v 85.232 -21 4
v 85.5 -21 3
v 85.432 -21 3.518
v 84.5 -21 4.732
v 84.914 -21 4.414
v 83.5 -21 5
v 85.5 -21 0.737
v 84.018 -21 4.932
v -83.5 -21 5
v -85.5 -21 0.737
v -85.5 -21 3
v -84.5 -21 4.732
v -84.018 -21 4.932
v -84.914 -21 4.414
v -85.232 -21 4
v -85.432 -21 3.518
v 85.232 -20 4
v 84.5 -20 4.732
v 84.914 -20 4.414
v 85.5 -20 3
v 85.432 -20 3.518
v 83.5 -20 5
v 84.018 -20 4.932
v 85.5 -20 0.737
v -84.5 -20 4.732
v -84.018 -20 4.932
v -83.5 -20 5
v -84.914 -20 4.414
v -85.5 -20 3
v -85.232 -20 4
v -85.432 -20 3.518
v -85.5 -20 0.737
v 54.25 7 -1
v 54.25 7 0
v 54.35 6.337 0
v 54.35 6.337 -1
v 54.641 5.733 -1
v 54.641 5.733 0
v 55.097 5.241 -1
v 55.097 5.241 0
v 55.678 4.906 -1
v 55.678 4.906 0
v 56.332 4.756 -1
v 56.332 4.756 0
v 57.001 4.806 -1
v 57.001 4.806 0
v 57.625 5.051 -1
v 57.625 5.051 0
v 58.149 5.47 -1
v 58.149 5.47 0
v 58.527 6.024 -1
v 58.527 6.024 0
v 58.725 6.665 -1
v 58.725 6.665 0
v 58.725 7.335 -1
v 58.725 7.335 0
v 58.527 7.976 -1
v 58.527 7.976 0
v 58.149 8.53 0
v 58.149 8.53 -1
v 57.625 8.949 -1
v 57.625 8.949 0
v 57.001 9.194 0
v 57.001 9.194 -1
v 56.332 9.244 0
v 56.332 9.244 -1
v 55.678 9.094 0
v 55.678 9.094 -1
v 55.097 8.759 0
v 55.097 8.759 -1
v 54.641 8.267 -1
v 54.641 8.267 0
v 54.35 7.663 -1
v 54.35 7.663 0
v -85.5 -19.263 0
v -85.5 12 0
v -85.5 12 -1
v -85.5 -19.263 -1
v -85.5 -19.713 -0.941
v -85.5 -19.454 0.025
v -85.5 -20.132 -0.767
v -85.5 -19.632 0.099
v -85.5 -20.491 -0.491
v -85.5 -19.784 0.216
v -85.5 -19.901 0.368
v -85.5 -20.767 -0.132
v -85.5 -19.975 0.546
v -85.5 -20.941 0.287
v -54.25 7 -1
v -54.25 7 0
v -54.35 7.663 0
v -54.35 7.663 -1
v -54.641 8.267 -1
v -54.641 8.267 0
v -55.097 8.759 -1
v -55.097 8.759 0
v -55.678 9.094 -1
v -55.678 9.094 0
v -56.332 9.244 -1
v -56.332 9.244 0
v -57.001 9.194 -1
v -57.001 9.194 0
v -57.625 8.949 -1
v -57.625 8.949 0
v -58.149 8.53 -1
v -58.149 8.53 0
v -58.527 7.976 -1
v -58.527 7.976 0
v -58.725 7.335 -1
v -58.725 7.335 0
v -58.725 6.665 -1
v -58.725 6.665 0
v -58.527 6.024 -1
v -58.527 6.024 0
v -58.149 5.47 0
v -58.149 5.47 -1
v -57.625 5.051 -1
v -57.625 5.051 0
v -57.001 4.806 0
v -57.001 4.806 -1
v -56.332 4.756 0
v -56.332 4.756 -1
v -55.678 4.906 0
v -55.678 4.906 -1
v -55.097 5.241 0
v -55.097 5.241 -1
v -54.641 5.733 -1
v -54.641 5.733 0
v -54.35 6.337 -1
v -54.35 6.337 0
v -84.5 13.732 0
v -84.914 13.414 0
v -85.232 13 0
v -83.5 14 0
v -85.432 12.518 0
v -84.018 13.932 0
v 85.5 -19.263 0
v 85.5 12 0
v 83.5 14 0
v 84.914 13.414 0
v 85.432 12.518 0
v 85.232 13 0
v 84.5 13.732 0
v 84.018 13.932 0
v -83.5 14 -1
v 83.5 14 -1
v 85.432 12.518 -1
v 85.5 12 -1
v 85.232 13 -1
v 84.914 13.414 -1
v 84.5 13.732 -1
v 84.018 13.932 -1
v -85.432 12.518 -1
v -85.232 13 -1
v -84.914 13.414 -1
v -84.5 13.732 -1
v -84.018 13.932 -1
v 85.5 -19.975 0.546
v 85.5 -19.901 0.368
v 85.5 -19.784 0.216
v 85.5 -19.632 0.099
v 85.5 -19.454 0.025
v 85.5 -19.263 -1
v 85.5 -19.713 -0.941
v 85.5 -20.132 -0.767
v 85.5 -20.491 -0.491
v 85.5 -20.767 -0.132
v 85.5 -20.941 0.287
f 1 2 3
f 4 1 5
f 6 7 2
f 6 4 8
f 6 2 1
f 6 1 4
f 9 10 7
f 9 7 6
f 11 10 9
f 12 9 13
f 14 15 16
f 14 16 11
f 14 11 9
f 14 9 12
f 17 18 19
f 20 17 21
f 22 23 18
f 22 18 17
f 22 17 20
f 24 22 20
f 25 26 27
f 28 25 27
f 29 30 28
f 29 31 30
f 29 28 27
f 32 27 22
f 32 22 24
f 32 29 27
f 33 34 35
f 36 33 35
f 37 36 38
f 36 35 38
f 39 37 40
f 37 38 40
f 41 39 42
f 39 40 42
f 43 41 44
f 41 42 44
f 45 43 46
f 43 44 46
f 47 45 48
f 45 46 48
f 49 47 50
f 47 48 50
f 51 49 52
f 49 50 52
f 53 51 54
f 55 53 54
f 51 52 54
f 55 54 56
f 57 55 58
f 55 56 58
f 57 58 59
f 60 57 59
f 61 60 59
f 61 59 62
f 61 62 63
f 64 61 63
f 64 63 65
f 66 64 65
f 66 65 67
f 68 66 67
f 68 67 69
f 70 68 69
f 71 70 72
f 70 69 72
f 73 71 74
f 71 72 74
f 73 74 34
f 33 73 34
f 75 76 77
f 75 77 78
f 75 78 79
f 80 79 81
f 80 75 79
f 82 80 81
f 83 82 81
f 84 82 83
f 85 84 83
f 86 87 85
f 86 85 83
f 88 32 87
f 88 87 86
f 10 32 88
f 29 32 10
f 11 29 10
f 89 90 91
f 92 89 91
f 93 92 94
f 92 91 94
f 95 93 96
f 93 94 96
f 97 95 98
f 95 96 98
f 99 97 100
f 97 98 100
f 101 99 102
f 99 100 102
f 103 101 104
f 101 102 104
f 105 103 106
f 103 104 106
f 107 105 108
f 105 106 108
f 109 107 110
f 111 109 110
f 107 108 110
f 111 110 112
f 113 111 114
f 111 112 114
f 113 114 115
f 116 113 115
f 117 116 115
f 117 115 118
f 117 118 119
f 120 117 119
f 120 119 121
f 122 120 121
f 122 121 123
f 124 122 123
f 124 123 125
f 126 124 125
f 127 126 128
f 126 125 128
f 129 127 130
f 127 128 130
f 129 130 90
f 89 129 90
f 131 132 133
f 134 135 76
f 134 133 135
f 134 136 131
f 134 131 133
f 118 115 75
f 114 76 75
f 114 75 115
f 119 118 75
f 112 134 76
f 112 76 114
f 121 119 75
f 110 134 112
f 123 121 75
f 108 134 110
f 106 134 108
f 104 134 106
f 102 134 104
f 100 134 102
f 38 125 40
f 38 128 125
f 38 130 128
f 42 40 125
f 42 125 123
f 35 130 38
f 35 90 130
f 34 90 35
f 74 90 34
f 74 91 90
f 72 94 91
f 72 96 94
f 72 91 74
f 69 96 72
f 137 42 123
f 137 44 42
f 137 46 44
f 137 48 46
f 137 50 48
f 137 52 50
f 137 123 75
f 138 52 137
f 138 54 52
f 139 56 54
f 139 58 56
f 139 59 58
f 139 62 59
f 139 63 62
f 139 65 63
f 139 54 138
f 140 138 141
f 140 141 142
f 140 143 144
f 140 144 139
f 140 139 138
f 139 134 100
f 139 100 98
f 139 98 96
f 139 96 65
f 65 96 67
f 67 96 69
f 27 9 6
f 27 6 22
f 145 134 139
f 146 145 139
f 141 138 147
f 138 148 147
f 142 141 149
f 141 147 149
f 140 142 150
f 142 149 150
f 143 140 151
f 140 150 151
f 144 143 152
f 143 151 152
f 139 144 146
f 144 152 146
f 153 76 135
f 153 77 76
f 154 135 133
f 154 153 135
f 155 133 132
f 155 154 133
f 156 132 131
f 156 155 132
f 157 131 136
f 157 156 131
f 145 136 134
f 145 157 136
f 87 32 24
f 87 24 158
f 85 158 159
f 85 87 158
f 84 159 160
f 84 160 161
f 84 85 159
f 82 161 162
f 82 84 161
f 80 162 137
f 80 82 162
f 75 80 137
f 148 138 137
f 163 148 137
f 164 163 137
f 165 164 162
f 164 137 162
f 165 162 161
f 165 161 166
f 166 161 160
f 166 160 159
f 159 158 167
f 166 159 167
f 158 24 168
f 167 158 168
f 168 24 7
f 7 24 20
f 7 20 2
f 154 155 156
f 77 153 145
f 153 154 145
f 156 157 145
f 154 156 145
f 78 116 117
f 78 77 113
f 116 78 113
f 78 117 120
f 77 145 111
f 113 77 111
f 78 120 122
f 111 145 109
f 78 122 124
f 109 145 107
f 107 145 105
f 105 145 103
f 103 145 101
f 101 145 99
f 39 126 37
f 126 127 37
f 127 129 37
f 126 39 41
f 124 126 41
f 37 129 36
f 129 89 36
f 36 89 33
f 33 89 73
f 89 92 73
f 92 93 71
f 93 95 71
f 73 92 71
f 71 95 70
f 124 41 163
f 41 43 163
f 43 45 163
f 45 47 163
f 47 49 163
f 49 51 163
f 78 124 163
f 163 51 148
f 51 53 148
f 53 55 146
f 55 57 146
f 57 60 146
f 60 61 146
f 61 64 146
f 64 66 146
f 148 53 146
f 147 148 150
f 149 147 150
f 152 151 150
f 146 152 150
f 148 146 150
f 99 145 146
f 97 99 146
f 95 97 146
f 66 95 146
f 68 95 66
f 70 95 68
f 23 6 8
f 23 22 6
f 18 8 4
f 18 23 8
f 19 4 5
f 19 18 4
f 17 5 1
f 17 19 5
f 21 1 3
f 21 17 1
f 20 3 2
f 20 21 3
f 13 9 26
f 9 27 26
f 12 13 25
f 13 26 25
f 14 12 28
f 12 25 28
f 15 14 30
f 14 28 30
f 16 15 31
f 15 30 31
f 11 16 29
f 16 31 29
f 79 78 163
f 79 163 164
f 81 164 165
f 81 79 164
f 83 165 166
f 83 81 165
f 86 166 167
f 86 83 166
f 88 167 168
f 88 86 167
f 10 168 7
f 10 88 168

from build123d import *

# Parameters (mm, degrees)
ESQUISSE1_W                           = 171
ESQUISSE1_H                           = 34
ESQUISSE1_R                           = 2.25
T_LE_DE_BASE_PLI_E1_DEPTH             = 1
T_LE_PLI_E_SUR_AR_TE1_STRIP_W         = 5.4732
T_LE_PLI_E_SUR_AR_TE1_STRIP_H         = 1
T_LE_PLI_E_SUR_AR_TE1_STRIP_CUT_DEPTH = 171
T_LE_PLI_E_SUR_AR_TE1_DEPTH           = 171
CONG_1_R                              = 2


# Sheet-metal steps are written as plain solids
with BuildPart() as part:
    # Esquisse1 → Tôle de base pliée1 (new body)
    with BuildSketch(Plane.XY):
        with Locations((0, -3)):
            Rectangle(ESQUISSE1_W, ESQUISSE1_H)
        with Locations((-56.5, 7)):
            Circle(ESQUISSE1_R, mode=Mode.SUBTRACT)
        with Locations(Location((56.5, 7, 0), (0, 0, 180))):
            Circle(ESQUISSE1_R, mode=Mode.SUBTRACT)
    extrude(amount=-T_LE_DE_BASE_PLI_E1_DEPTH)

    # Tôle pliée sur arête1 strip (across the edge) → Tôle pliée sur arête1 strip cut (cut)
    with BuildSketch(Plane(origin=(-85.5, -20, 0), x_dir=(0, 1, 0), z_dir=(1, 0, 0))):
        with Locations((-2, -0.5)):
            Rectangle(T_LE_PLI_E_SUR_AR_TE1_STRIP_W, T_LE_PLI_E_SUR_AR_TE1_STRIP_H)
    extrude(amount=T_LE_PLI_E_SUR_AR_TE1_STRIP_CUT_DEPTH, mode=Mode.SUBTRACT)

    # Tôle pliée sur arête1 section (across the edge) → Tôle pliée sur arête1 (add)
    with BuildSketch(Plane(origin=(-85.5, -20, 0), x_dir=(0, 1, 0), z_dir=(1, 0, 0))):
        with BuildLine():
            Line((-1, 0.7366), (-1, 5))
            Line((-1, 5), (0, 5))
            Line((0, 5), (0, 0.7366))
            ThreePointArc((0, 0.7366), (0.215745145, 0.215745145), (0.7366, 0))
            Line((0.7366, 0), (0.7366, -1))
            ThreePointArc((0.7366, -1), (-0.491361636, -0.491361636), (-1, 0.7366))
        make_face()
    extrude(amount=T_LE_PLI_E_SUR_AR_TE1_DEPTH)

    # Congé1
    cong_1_edges = [part.edges().sort_by_distance(p)[0] for p in [
        (-85.5, -20.5, 5),
        (85.5, -20.5, 5),
        (-85.5, 14, -0.5),
        (85.5, 14, -0.5),
    ]]
    fillet(cong_1_edges, radius=CONG_1_R)


solid = part.part
